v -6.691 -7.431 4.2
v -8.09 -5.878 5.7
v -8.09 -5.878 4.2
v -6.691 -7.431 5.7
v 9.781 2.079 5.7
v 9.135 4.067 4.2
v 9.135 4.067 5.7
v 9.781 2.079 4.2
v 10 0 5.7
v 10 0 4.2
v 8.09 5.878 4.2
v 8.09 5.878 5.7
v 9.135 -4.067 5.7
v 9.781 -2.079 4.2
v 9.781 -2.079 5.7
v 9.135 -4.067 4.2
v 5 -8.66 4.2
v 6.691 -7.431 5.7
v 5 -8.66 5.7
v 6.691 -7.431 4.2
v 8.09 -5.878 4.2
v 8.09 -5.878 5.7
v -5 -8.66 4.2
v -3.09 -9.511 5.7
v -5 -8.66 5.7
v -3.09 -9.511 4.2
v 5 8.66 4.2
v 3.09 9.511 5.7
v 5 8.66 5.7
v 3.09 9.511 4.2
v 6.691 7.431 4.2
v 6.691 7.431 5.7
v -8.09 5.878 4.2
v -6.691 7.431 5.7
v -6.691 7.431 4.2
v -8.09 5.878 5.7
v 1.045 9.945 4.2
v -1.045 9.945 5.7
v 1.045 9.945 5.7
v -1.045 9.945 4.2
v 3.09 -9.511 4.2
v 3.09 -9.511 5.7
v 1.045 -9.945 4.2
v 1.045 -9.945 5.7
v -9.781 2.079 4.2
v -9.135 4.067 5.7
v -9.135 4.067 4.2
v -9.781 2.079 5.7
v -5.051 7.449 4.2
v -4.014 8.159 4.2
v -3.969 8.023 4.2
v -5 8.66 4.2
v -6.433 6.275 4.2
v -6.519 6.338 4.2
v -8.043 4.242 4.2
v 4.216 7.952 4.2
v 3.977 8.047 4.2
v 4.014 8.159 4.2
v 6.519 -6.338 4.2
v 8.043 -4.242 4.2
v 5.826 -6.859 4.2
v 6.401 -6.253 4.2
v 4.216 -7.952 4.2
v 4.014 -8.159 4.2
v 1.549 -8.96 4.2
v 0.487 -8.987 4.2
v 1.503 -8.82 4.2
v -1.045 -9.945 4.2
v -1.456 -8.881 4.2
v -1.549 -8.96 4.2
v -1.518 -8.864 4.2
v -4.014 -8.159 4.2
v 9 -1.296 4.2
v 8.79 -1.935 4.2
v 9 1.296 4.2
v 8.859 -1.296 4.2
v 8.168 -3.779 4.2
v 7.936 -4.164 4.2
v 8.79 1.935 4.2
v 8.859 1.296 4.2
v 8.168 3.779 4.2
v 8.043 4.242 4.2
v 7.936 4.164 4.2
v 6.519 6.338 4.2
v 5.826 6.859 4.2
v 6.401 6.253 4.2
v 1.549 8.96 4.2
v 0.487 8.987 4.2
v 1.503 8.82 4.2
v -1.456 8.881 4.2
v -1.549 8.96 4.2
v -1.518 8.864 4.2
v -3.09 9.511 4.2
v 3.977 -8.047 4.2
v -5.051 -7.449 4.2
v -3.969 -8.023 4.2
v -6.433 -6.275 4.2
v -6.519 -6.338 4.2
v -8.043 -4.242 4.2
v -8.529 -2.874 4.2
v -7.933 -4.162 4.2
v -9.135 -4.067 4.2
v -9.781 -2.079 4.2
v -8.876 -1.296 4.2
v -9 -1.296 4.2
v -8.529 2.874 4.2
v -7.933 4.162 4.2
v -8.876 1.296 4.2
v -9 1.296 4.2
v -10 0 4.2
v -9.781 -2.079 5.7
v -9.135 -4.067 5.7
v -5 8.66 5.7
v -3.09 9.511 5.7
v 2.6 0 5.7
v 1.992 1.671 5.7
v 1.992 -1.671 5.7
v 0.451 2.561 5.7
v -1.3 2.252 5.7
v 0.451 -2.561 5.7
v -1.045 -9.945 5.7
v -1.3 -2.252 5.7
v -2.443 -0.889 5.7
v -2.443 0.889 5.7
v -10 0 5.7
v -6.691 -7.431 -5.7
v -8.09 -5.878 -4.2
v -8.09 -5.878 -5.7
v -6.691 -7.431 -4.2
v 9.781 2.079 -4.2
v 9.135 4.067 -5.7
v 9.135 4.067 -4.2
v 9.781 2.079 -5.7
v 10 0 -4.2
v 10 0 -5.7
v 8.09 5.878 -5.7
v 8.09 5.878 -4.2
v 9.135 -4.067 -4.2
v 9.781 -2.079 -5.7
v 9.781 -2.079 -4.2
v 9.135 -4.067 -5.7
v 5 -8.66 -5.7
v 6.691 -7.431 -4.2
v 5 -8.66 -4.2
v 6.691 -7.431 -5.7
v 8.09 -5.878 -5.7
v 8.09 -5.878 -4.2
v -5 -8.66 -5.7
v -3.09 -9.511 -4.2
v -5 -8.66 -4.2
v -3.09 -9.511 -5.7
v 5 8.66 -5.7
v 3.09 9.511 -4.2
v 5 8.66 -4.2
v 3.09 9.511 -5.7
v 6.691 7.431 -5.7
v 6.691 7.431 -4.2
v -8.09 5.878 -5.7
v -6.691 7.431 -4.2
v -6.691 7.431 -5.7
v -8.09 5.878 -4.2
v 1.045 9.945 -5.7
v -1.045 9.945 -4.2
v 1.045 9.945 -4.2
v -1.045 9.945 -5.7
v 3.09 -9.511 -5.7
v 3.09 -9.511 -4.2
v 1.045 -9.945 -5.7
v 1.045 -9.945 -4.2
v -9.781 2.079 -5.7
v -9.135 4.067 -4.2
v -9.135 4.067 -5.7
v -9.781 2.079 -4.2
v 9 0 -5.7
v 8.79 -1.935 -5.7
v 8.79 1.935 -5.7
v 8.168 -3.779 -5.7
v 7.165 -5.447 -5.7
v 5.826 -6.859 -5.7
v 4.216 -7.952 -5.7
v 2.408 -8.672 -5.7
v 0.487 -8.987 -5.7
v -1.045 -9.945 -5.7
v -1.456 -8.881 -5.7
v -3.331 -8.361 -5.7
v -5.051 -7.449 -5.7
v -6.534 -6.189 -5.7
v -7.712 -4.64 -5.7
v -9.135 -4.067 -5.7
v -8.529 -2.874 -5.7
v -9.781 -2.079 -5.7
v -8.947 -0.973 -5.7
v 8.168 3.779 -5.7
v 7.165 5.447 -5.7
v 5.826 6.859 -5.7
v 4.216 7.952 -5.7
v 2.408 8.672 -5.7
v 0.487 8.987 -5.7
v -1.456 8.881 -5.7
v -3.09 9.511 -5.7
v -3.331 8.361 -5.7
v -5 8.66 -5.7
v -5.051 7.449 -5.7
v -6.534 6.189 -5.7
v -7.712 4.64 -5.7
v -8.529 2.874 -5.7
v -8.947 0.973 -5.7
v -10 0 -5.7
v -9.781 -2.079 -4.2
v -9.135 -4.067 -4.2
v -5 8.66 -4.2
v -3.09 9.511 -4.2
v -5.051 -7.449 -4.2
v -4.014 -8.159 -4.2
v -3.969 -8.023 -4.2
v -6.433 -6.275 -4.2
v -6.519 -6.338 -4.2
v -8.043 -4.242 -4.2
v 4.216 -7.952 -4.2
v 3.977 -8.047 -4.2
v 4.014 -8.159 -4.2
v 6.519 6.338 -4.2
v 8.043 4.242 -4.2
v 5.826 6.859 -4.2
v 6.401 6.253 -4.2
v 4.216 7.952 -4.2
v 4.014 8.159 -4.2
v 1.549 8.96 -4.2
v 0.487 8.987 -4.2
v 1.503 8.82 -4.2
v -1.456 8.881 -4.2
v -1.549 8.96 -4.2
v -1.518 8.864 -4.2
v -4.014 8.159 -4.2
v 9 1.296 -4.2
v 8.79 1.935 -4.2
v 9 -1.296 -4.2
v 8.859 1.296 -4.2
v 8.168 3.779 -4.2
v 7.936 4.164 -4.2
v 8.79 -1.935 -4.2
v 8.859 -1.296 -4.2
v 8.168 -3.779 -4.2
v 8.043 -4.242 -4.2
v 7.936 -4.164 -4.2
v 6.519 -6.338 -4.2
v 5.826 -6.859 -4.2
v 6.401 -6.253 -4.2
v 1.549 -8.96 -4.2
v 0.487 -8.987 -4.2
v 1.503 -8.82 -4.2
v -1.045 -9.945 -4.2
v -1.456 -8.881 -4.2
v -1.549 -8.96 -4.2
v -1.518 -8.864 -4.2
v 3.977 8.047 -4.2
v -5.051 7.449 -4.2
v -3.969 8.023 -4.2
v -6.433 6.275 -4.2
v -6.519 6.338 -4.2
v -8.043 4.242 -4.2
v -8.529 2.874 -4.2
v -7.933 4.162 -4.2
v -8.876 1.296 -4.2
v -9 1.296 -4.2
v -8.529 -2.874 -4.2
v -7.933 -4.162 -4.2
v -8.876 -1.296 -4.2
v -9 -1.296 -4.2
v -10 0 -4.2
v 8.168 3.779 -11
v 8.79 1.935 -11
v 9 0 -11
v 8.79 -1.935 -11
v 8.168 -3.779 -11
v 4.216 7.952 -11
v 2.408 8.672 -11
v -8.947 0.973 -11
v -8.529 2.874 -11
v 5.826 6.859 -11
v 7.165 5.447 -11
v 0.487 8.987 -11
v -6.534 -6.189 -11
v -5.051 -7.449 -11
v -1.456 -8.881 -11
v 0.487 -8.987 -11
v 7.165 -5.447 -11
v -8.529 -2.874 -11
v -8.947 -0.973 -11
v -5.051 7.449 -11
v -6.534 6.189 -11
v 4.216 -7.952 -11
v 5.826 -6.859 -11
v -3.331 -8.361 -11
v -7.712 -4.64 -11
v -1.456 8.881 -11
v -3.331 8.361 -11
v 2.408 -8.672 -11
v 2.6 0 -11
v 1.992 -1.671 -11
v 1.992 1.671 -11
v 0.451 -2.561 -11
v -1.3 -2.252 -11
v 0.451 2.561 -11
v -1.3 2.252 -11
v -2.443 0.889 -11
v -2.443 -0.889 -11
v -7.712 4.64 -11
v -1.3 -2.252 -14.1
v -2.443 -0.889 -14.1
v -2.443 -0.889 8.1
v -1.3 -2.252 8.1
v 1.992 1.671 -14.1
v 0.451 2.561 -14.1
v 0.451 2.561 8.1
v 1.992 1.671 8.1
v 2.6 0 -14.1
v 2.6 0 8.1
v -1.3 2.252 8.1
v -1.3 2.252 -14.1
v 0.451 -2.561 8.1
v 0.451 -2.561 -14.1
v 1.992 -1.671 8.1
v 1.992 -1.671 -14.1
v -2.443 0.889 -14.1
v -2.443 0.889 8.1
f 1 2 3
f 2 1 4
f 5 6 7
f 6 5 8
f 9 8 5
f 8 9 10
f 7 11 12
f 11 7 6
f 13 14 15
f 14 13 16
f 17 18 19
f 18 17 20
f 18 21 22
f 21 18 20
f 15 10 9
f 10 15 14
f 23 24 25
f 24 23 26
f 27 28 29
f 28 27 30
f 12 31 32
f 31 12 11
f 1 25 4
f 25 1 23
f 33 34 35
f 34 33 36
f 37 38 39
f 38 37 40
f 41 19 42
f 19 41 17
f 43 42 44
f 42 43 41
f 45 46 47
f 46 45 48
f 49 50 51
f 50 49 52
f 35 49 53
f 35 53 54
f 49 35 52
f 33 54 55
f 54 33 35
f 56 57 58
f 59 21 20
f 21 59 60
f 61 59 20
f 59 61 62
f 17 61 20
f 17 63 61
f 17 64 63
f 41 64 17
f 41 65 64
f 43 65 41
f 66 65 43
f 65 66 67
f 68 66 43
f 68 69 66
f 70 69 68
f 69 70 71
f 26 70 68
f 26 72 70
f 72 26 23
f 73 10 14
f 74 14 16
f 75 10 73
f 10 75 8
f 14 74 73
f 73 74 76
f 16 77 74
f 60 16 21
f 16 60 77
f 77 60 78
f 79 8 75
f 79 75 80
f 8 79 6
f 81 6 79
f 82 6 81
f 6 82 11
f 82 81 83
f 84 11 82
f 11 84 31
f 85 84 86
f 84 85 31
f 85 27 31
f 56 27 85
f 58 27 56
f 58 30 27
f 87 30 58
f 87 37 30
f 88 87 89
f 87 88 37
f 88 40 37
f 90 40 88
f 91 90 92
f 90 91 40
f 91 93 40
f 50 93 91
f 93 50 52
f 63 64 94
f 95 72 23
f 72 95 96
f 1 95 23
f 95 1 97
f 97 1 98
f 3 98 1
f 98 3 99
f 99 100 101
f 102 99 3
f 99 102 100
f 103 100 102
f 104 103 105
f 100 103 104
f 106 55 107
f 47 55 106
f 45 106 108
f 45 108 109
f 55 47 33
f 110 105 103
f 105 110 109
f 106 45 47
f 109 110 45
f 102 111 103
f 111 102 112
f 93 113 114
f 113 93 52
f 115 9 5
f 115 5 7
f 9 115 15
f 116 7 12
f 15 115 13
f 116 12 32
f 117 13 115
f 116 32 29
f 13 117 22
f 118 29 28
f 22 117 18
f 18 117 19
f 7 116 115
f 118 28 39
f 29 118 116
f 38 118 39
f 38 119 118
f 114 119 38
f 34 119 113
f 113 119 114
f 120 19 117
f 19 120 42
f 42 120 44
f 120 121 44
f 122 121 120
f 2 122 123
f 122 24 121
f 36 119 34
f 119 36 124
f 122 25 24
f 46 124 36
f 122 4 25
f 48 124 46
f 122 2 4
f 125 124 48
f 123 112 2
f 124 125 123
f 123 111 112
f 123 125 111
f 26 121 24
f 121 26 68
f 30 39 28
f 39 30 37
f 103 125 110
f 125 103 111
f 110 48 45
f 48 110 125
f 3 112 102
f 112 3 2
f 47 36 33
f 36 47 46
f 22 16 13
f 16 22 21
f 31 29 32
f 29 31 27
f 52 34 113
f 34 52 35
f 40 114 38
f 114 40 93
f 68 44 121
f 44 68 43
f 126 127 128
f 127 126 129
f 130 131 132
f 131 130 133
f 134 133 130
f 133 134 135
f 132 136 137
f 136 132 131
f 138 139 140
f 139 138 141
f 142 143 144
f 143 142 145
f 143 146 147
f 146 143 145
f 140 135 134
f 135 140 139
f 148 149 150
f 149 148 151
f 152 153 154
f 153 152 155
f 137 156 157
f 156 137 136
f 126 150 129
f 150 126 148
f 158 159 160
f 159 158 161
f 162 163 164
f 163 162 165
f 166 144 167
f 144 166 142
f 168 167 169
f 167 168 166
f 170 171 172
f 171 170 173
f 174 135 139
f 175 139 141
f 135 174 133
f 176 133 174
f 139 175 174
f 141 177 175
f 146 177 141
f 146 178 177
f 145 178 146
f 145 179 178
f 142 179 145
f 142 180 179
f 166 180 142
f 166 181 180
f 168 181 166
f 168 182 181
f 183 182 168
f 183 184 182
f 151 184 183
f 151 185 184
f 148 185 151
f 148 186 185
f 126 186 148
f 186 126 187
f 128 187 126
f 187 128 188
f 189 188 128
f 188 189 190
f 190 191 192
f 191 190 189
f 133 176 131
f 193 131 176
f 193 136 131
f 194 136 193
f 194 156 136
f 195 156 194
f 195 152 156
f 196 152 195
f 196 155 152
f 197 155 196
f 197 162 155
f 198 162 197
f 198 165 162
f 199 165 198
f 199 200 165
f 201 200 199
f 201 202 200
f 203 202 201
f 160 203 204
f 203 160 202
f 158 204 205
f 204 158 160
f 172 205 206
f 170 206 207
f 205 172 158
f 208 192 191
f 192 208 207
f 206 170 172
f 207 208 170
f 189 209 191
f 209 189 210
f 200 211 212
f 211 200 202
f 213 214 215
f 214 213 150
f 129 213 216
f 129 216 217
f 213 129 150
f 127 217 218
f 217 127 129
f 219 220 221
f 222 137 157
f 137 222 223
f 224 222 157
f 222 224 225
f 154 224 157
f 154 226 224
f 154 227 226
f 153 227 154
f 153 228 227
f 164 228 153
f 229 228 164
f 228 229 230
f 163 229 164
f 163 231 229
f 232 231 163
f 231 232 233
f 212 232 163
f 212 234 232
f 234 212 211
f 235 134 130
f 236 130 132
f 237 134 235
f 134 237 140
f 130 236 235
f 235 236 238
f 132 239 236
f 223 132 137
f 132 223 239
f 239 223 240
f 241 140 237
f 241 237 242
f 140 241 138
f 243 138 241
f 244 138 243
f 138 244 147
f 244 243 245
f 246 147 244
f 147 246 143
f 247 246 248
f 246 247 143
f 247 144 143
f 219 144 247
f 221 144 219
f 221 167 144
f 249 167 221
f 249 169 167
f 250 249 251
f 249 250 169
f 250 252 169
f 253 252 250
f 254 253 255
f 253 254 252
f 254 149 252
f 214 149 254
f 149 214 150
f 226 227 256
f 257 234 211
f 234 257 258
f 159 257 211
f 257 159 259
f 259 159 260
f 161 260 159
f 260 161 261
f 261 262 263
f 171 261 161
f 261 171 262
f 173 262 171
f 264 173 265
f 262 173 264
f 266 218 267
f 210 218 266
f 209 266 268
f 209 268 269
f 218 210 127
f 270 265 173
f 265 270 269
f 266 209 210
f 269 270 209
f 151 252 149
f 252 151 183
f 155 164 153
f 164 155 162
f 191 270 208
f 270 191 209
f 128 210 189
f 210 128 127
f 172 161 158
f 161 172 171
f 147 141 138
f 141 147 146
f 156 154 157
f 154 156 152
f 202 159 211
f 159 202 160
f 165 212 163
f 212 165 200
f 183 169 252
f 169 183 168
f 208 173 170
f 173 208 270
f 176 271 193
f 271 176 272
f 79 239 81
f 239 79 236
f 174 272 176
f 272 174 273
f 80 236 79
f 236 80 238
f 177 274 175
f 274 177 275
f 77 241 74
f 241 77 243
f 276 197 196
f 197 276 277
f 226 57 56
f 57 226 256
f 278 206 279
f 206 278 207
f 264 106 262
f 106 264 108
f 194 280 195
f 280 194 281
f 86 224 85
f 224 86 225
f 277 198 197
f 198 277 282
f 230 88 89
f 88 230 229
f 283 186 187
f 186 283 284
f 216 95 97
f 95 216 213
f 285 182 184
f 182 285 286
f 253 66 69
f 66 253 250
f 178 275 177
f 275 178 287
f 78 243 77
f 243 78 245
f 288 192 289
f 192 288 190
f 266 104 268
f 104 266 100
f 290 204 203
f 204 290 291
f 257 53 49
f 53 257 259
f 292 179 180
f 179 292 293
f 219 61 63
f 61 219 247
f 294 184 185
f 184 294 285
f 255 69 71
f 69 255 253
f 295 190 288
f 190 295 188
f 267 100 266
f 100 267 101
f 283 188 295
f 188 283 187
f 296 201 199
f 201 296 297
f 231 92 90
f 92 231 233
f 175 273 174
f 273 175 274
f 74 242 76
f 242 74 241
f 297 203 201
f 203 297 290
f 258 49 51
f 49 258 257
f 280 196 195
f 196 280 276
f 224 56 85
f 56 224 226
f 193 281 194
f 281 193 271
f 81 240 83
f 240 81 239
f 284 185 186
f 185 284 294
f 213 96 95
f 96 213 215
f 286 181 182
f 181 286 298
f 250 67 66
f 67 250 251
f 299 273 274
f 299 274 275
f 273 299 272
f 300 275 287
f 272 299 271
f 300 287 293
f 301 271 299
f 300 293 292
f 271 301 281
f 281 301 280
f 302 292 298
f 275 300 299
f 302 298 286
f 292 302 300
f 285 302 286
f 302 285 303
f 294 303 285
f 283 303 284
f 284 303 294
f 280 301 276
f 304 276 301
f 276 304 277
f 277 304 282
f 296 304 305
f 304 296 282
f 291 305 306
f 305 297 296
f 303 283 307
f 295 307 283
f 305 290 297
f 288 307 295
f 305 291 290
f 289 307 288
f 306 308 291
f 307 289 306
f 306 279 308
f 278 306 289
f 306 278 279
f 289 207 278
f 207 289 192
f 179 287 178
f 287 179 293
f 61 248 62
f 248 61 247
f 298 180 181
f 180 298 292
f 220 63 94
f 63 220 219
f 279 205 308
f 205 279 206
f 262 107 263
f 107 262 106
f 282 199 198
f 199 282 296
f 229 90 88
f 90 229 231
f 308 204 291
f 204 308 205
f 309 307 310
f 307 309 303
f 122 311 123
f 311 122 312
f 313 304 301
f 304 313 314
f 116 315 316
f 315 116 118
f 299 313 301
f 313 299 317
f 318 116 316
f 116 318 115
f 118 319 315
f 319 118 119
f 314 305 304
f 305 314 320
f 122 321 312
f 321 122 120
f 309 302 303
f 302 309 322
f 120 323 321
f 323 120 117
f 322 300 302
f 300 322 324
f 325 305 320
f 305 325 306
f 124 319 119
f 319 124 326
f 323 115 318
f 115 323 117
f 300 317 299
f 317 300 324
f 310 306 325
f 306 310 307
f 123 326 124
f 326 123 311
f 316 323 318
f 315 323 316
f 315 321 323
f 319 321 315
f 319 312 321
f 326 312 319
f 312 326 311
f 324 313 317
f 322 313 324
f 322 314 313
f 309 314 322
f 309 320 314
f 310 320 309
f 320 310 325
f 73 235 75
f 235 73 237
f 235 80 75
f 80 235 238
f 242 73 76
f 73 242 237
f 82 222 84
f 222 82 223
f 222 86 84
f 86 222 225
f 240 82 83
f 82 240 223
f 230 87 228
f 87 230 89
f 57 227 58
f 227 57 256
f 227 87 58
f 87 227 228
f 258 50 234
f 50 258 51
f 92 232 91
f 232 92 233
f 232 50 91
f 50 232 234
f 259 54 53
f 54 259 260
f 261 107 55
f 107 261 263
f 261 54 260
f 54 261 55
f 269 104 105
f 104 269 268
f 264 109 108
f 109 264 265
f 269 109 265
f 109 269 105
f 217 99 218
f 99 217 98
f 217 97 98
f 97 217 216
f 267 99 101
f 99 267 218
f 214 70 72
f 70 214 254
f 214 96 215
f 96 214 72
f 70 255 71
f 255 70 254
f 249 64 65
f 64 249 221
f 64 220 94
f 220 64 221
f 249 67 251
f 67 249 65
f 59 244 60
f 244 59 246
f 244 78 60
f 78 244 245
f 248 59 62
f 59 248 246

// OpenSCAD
// Parameters
tooth_count = 10; //[5:40:1]
pitch_diameter_mm = 15; //[7.5:30:0.1]
pitch_radius_mm = 7.5; //[3.75:15:0.1]
pulley_width_mm = 10; //[5:30:0.5]
bore_diameter_mm = 5; //[2:12:0.1]
hub_diameter_mm = 18; //[10:36:0.5]
hub_length_mm = 6; //[0:20:0.5]
flange_diameter_mm = 20; //[12:40:0.5]
flange_thickness_mm = 1.5; //[0:5:0.1]
set_screw_count = 1; //[0:2:1]
set_screw_size = 3; //[2:6:0.5]
set_screw_z_mm = 0; //[-20:20:0.5]
tolerance_mm = 0.2; //[0:0.6:0.05]
tooth_radial_height_mm = 1.2; //[0.6:2.4:0.1]
tooth_root_depth_mm = 0.6; //[0.3:1.5:0.1]
tooth_tangential_width_factor = 0.55; //[0.3:0.8:0.01]
overlap_mm = 0.8; //[0.5:2:0.1]

// Pulley - complete geometry
module pulley() {
  color("Silver") {
    // Toothed Pulley Body
    translate([0, 0, 0])
      cylinder(r=pitch_radius_mm + tooth_radial_height_mm, h=pulley_width_mm, center=true);

    // Hub
    translate([0, 0, -hub_length_mm/2])
      cylinder(r=hub_diameter_mm/2, h=pulley_width_mm + hub_length_mm, center=true);

    // Flanges
    if (flange_thickness_mm > 0) {
      translate([0, 0, pulley_width_mm/2 + flange_thickness_mm/2 - overlap_mm])
        cylinder(r=flange_diameter_mm/2, h=flange_thickness_mm, center=true);
      translate([0, 0, -pulley_width_mm/2 - flange_thickness_mm/2 + overlap_mm])
        cylinder(r=flange_diameter_mm/2, h=flange_thickness_mm, center=true);
    }

    // Central Bore
    translate([0, 0, -hub_length_mm/2])
      cylinder(r=(bore_diameter_mm + tolerance_mm)/2, h=pulley_width_mm + hub_length_mm + 2*flange_thickness_mm + 4*overlap_mm, center=true);
  }
}

// Printed Pulley Teeth - complete geometry
module printed_pulley_teeth() {
  color("DimGray") {
    for (i = [0:tooth_count-1]) {
      rotate([0, 0, i*360/tooth_count])
        translate([pitch_radius_mm + tooth_radial_height_mm/2 - overlap_mm/2, 0, 0])
          cube([tooth_radial_height_mm + tooth_root_depth_mm + overlap_mm, (PI * pitch_diameter_mm / tooth_count) * tooth_tangential_width_factor, pulley_width_mm], center=true);
    }
  }
}

// Printed Pulley Teeth From Profile - complete geometry
module printed_pulley_teeth_from_profile() {
  printed_pulley_teeth();
}

// Printed Pulley GT2 Teeth - complete geometry
module printed_pulley_GT2_teeth() {
  printed_pulley_teeth_from_profile();
}

// Assembly
module assembly() {
  pulley();
  printed_pulley_GT2_teeth();
}

assembly();
